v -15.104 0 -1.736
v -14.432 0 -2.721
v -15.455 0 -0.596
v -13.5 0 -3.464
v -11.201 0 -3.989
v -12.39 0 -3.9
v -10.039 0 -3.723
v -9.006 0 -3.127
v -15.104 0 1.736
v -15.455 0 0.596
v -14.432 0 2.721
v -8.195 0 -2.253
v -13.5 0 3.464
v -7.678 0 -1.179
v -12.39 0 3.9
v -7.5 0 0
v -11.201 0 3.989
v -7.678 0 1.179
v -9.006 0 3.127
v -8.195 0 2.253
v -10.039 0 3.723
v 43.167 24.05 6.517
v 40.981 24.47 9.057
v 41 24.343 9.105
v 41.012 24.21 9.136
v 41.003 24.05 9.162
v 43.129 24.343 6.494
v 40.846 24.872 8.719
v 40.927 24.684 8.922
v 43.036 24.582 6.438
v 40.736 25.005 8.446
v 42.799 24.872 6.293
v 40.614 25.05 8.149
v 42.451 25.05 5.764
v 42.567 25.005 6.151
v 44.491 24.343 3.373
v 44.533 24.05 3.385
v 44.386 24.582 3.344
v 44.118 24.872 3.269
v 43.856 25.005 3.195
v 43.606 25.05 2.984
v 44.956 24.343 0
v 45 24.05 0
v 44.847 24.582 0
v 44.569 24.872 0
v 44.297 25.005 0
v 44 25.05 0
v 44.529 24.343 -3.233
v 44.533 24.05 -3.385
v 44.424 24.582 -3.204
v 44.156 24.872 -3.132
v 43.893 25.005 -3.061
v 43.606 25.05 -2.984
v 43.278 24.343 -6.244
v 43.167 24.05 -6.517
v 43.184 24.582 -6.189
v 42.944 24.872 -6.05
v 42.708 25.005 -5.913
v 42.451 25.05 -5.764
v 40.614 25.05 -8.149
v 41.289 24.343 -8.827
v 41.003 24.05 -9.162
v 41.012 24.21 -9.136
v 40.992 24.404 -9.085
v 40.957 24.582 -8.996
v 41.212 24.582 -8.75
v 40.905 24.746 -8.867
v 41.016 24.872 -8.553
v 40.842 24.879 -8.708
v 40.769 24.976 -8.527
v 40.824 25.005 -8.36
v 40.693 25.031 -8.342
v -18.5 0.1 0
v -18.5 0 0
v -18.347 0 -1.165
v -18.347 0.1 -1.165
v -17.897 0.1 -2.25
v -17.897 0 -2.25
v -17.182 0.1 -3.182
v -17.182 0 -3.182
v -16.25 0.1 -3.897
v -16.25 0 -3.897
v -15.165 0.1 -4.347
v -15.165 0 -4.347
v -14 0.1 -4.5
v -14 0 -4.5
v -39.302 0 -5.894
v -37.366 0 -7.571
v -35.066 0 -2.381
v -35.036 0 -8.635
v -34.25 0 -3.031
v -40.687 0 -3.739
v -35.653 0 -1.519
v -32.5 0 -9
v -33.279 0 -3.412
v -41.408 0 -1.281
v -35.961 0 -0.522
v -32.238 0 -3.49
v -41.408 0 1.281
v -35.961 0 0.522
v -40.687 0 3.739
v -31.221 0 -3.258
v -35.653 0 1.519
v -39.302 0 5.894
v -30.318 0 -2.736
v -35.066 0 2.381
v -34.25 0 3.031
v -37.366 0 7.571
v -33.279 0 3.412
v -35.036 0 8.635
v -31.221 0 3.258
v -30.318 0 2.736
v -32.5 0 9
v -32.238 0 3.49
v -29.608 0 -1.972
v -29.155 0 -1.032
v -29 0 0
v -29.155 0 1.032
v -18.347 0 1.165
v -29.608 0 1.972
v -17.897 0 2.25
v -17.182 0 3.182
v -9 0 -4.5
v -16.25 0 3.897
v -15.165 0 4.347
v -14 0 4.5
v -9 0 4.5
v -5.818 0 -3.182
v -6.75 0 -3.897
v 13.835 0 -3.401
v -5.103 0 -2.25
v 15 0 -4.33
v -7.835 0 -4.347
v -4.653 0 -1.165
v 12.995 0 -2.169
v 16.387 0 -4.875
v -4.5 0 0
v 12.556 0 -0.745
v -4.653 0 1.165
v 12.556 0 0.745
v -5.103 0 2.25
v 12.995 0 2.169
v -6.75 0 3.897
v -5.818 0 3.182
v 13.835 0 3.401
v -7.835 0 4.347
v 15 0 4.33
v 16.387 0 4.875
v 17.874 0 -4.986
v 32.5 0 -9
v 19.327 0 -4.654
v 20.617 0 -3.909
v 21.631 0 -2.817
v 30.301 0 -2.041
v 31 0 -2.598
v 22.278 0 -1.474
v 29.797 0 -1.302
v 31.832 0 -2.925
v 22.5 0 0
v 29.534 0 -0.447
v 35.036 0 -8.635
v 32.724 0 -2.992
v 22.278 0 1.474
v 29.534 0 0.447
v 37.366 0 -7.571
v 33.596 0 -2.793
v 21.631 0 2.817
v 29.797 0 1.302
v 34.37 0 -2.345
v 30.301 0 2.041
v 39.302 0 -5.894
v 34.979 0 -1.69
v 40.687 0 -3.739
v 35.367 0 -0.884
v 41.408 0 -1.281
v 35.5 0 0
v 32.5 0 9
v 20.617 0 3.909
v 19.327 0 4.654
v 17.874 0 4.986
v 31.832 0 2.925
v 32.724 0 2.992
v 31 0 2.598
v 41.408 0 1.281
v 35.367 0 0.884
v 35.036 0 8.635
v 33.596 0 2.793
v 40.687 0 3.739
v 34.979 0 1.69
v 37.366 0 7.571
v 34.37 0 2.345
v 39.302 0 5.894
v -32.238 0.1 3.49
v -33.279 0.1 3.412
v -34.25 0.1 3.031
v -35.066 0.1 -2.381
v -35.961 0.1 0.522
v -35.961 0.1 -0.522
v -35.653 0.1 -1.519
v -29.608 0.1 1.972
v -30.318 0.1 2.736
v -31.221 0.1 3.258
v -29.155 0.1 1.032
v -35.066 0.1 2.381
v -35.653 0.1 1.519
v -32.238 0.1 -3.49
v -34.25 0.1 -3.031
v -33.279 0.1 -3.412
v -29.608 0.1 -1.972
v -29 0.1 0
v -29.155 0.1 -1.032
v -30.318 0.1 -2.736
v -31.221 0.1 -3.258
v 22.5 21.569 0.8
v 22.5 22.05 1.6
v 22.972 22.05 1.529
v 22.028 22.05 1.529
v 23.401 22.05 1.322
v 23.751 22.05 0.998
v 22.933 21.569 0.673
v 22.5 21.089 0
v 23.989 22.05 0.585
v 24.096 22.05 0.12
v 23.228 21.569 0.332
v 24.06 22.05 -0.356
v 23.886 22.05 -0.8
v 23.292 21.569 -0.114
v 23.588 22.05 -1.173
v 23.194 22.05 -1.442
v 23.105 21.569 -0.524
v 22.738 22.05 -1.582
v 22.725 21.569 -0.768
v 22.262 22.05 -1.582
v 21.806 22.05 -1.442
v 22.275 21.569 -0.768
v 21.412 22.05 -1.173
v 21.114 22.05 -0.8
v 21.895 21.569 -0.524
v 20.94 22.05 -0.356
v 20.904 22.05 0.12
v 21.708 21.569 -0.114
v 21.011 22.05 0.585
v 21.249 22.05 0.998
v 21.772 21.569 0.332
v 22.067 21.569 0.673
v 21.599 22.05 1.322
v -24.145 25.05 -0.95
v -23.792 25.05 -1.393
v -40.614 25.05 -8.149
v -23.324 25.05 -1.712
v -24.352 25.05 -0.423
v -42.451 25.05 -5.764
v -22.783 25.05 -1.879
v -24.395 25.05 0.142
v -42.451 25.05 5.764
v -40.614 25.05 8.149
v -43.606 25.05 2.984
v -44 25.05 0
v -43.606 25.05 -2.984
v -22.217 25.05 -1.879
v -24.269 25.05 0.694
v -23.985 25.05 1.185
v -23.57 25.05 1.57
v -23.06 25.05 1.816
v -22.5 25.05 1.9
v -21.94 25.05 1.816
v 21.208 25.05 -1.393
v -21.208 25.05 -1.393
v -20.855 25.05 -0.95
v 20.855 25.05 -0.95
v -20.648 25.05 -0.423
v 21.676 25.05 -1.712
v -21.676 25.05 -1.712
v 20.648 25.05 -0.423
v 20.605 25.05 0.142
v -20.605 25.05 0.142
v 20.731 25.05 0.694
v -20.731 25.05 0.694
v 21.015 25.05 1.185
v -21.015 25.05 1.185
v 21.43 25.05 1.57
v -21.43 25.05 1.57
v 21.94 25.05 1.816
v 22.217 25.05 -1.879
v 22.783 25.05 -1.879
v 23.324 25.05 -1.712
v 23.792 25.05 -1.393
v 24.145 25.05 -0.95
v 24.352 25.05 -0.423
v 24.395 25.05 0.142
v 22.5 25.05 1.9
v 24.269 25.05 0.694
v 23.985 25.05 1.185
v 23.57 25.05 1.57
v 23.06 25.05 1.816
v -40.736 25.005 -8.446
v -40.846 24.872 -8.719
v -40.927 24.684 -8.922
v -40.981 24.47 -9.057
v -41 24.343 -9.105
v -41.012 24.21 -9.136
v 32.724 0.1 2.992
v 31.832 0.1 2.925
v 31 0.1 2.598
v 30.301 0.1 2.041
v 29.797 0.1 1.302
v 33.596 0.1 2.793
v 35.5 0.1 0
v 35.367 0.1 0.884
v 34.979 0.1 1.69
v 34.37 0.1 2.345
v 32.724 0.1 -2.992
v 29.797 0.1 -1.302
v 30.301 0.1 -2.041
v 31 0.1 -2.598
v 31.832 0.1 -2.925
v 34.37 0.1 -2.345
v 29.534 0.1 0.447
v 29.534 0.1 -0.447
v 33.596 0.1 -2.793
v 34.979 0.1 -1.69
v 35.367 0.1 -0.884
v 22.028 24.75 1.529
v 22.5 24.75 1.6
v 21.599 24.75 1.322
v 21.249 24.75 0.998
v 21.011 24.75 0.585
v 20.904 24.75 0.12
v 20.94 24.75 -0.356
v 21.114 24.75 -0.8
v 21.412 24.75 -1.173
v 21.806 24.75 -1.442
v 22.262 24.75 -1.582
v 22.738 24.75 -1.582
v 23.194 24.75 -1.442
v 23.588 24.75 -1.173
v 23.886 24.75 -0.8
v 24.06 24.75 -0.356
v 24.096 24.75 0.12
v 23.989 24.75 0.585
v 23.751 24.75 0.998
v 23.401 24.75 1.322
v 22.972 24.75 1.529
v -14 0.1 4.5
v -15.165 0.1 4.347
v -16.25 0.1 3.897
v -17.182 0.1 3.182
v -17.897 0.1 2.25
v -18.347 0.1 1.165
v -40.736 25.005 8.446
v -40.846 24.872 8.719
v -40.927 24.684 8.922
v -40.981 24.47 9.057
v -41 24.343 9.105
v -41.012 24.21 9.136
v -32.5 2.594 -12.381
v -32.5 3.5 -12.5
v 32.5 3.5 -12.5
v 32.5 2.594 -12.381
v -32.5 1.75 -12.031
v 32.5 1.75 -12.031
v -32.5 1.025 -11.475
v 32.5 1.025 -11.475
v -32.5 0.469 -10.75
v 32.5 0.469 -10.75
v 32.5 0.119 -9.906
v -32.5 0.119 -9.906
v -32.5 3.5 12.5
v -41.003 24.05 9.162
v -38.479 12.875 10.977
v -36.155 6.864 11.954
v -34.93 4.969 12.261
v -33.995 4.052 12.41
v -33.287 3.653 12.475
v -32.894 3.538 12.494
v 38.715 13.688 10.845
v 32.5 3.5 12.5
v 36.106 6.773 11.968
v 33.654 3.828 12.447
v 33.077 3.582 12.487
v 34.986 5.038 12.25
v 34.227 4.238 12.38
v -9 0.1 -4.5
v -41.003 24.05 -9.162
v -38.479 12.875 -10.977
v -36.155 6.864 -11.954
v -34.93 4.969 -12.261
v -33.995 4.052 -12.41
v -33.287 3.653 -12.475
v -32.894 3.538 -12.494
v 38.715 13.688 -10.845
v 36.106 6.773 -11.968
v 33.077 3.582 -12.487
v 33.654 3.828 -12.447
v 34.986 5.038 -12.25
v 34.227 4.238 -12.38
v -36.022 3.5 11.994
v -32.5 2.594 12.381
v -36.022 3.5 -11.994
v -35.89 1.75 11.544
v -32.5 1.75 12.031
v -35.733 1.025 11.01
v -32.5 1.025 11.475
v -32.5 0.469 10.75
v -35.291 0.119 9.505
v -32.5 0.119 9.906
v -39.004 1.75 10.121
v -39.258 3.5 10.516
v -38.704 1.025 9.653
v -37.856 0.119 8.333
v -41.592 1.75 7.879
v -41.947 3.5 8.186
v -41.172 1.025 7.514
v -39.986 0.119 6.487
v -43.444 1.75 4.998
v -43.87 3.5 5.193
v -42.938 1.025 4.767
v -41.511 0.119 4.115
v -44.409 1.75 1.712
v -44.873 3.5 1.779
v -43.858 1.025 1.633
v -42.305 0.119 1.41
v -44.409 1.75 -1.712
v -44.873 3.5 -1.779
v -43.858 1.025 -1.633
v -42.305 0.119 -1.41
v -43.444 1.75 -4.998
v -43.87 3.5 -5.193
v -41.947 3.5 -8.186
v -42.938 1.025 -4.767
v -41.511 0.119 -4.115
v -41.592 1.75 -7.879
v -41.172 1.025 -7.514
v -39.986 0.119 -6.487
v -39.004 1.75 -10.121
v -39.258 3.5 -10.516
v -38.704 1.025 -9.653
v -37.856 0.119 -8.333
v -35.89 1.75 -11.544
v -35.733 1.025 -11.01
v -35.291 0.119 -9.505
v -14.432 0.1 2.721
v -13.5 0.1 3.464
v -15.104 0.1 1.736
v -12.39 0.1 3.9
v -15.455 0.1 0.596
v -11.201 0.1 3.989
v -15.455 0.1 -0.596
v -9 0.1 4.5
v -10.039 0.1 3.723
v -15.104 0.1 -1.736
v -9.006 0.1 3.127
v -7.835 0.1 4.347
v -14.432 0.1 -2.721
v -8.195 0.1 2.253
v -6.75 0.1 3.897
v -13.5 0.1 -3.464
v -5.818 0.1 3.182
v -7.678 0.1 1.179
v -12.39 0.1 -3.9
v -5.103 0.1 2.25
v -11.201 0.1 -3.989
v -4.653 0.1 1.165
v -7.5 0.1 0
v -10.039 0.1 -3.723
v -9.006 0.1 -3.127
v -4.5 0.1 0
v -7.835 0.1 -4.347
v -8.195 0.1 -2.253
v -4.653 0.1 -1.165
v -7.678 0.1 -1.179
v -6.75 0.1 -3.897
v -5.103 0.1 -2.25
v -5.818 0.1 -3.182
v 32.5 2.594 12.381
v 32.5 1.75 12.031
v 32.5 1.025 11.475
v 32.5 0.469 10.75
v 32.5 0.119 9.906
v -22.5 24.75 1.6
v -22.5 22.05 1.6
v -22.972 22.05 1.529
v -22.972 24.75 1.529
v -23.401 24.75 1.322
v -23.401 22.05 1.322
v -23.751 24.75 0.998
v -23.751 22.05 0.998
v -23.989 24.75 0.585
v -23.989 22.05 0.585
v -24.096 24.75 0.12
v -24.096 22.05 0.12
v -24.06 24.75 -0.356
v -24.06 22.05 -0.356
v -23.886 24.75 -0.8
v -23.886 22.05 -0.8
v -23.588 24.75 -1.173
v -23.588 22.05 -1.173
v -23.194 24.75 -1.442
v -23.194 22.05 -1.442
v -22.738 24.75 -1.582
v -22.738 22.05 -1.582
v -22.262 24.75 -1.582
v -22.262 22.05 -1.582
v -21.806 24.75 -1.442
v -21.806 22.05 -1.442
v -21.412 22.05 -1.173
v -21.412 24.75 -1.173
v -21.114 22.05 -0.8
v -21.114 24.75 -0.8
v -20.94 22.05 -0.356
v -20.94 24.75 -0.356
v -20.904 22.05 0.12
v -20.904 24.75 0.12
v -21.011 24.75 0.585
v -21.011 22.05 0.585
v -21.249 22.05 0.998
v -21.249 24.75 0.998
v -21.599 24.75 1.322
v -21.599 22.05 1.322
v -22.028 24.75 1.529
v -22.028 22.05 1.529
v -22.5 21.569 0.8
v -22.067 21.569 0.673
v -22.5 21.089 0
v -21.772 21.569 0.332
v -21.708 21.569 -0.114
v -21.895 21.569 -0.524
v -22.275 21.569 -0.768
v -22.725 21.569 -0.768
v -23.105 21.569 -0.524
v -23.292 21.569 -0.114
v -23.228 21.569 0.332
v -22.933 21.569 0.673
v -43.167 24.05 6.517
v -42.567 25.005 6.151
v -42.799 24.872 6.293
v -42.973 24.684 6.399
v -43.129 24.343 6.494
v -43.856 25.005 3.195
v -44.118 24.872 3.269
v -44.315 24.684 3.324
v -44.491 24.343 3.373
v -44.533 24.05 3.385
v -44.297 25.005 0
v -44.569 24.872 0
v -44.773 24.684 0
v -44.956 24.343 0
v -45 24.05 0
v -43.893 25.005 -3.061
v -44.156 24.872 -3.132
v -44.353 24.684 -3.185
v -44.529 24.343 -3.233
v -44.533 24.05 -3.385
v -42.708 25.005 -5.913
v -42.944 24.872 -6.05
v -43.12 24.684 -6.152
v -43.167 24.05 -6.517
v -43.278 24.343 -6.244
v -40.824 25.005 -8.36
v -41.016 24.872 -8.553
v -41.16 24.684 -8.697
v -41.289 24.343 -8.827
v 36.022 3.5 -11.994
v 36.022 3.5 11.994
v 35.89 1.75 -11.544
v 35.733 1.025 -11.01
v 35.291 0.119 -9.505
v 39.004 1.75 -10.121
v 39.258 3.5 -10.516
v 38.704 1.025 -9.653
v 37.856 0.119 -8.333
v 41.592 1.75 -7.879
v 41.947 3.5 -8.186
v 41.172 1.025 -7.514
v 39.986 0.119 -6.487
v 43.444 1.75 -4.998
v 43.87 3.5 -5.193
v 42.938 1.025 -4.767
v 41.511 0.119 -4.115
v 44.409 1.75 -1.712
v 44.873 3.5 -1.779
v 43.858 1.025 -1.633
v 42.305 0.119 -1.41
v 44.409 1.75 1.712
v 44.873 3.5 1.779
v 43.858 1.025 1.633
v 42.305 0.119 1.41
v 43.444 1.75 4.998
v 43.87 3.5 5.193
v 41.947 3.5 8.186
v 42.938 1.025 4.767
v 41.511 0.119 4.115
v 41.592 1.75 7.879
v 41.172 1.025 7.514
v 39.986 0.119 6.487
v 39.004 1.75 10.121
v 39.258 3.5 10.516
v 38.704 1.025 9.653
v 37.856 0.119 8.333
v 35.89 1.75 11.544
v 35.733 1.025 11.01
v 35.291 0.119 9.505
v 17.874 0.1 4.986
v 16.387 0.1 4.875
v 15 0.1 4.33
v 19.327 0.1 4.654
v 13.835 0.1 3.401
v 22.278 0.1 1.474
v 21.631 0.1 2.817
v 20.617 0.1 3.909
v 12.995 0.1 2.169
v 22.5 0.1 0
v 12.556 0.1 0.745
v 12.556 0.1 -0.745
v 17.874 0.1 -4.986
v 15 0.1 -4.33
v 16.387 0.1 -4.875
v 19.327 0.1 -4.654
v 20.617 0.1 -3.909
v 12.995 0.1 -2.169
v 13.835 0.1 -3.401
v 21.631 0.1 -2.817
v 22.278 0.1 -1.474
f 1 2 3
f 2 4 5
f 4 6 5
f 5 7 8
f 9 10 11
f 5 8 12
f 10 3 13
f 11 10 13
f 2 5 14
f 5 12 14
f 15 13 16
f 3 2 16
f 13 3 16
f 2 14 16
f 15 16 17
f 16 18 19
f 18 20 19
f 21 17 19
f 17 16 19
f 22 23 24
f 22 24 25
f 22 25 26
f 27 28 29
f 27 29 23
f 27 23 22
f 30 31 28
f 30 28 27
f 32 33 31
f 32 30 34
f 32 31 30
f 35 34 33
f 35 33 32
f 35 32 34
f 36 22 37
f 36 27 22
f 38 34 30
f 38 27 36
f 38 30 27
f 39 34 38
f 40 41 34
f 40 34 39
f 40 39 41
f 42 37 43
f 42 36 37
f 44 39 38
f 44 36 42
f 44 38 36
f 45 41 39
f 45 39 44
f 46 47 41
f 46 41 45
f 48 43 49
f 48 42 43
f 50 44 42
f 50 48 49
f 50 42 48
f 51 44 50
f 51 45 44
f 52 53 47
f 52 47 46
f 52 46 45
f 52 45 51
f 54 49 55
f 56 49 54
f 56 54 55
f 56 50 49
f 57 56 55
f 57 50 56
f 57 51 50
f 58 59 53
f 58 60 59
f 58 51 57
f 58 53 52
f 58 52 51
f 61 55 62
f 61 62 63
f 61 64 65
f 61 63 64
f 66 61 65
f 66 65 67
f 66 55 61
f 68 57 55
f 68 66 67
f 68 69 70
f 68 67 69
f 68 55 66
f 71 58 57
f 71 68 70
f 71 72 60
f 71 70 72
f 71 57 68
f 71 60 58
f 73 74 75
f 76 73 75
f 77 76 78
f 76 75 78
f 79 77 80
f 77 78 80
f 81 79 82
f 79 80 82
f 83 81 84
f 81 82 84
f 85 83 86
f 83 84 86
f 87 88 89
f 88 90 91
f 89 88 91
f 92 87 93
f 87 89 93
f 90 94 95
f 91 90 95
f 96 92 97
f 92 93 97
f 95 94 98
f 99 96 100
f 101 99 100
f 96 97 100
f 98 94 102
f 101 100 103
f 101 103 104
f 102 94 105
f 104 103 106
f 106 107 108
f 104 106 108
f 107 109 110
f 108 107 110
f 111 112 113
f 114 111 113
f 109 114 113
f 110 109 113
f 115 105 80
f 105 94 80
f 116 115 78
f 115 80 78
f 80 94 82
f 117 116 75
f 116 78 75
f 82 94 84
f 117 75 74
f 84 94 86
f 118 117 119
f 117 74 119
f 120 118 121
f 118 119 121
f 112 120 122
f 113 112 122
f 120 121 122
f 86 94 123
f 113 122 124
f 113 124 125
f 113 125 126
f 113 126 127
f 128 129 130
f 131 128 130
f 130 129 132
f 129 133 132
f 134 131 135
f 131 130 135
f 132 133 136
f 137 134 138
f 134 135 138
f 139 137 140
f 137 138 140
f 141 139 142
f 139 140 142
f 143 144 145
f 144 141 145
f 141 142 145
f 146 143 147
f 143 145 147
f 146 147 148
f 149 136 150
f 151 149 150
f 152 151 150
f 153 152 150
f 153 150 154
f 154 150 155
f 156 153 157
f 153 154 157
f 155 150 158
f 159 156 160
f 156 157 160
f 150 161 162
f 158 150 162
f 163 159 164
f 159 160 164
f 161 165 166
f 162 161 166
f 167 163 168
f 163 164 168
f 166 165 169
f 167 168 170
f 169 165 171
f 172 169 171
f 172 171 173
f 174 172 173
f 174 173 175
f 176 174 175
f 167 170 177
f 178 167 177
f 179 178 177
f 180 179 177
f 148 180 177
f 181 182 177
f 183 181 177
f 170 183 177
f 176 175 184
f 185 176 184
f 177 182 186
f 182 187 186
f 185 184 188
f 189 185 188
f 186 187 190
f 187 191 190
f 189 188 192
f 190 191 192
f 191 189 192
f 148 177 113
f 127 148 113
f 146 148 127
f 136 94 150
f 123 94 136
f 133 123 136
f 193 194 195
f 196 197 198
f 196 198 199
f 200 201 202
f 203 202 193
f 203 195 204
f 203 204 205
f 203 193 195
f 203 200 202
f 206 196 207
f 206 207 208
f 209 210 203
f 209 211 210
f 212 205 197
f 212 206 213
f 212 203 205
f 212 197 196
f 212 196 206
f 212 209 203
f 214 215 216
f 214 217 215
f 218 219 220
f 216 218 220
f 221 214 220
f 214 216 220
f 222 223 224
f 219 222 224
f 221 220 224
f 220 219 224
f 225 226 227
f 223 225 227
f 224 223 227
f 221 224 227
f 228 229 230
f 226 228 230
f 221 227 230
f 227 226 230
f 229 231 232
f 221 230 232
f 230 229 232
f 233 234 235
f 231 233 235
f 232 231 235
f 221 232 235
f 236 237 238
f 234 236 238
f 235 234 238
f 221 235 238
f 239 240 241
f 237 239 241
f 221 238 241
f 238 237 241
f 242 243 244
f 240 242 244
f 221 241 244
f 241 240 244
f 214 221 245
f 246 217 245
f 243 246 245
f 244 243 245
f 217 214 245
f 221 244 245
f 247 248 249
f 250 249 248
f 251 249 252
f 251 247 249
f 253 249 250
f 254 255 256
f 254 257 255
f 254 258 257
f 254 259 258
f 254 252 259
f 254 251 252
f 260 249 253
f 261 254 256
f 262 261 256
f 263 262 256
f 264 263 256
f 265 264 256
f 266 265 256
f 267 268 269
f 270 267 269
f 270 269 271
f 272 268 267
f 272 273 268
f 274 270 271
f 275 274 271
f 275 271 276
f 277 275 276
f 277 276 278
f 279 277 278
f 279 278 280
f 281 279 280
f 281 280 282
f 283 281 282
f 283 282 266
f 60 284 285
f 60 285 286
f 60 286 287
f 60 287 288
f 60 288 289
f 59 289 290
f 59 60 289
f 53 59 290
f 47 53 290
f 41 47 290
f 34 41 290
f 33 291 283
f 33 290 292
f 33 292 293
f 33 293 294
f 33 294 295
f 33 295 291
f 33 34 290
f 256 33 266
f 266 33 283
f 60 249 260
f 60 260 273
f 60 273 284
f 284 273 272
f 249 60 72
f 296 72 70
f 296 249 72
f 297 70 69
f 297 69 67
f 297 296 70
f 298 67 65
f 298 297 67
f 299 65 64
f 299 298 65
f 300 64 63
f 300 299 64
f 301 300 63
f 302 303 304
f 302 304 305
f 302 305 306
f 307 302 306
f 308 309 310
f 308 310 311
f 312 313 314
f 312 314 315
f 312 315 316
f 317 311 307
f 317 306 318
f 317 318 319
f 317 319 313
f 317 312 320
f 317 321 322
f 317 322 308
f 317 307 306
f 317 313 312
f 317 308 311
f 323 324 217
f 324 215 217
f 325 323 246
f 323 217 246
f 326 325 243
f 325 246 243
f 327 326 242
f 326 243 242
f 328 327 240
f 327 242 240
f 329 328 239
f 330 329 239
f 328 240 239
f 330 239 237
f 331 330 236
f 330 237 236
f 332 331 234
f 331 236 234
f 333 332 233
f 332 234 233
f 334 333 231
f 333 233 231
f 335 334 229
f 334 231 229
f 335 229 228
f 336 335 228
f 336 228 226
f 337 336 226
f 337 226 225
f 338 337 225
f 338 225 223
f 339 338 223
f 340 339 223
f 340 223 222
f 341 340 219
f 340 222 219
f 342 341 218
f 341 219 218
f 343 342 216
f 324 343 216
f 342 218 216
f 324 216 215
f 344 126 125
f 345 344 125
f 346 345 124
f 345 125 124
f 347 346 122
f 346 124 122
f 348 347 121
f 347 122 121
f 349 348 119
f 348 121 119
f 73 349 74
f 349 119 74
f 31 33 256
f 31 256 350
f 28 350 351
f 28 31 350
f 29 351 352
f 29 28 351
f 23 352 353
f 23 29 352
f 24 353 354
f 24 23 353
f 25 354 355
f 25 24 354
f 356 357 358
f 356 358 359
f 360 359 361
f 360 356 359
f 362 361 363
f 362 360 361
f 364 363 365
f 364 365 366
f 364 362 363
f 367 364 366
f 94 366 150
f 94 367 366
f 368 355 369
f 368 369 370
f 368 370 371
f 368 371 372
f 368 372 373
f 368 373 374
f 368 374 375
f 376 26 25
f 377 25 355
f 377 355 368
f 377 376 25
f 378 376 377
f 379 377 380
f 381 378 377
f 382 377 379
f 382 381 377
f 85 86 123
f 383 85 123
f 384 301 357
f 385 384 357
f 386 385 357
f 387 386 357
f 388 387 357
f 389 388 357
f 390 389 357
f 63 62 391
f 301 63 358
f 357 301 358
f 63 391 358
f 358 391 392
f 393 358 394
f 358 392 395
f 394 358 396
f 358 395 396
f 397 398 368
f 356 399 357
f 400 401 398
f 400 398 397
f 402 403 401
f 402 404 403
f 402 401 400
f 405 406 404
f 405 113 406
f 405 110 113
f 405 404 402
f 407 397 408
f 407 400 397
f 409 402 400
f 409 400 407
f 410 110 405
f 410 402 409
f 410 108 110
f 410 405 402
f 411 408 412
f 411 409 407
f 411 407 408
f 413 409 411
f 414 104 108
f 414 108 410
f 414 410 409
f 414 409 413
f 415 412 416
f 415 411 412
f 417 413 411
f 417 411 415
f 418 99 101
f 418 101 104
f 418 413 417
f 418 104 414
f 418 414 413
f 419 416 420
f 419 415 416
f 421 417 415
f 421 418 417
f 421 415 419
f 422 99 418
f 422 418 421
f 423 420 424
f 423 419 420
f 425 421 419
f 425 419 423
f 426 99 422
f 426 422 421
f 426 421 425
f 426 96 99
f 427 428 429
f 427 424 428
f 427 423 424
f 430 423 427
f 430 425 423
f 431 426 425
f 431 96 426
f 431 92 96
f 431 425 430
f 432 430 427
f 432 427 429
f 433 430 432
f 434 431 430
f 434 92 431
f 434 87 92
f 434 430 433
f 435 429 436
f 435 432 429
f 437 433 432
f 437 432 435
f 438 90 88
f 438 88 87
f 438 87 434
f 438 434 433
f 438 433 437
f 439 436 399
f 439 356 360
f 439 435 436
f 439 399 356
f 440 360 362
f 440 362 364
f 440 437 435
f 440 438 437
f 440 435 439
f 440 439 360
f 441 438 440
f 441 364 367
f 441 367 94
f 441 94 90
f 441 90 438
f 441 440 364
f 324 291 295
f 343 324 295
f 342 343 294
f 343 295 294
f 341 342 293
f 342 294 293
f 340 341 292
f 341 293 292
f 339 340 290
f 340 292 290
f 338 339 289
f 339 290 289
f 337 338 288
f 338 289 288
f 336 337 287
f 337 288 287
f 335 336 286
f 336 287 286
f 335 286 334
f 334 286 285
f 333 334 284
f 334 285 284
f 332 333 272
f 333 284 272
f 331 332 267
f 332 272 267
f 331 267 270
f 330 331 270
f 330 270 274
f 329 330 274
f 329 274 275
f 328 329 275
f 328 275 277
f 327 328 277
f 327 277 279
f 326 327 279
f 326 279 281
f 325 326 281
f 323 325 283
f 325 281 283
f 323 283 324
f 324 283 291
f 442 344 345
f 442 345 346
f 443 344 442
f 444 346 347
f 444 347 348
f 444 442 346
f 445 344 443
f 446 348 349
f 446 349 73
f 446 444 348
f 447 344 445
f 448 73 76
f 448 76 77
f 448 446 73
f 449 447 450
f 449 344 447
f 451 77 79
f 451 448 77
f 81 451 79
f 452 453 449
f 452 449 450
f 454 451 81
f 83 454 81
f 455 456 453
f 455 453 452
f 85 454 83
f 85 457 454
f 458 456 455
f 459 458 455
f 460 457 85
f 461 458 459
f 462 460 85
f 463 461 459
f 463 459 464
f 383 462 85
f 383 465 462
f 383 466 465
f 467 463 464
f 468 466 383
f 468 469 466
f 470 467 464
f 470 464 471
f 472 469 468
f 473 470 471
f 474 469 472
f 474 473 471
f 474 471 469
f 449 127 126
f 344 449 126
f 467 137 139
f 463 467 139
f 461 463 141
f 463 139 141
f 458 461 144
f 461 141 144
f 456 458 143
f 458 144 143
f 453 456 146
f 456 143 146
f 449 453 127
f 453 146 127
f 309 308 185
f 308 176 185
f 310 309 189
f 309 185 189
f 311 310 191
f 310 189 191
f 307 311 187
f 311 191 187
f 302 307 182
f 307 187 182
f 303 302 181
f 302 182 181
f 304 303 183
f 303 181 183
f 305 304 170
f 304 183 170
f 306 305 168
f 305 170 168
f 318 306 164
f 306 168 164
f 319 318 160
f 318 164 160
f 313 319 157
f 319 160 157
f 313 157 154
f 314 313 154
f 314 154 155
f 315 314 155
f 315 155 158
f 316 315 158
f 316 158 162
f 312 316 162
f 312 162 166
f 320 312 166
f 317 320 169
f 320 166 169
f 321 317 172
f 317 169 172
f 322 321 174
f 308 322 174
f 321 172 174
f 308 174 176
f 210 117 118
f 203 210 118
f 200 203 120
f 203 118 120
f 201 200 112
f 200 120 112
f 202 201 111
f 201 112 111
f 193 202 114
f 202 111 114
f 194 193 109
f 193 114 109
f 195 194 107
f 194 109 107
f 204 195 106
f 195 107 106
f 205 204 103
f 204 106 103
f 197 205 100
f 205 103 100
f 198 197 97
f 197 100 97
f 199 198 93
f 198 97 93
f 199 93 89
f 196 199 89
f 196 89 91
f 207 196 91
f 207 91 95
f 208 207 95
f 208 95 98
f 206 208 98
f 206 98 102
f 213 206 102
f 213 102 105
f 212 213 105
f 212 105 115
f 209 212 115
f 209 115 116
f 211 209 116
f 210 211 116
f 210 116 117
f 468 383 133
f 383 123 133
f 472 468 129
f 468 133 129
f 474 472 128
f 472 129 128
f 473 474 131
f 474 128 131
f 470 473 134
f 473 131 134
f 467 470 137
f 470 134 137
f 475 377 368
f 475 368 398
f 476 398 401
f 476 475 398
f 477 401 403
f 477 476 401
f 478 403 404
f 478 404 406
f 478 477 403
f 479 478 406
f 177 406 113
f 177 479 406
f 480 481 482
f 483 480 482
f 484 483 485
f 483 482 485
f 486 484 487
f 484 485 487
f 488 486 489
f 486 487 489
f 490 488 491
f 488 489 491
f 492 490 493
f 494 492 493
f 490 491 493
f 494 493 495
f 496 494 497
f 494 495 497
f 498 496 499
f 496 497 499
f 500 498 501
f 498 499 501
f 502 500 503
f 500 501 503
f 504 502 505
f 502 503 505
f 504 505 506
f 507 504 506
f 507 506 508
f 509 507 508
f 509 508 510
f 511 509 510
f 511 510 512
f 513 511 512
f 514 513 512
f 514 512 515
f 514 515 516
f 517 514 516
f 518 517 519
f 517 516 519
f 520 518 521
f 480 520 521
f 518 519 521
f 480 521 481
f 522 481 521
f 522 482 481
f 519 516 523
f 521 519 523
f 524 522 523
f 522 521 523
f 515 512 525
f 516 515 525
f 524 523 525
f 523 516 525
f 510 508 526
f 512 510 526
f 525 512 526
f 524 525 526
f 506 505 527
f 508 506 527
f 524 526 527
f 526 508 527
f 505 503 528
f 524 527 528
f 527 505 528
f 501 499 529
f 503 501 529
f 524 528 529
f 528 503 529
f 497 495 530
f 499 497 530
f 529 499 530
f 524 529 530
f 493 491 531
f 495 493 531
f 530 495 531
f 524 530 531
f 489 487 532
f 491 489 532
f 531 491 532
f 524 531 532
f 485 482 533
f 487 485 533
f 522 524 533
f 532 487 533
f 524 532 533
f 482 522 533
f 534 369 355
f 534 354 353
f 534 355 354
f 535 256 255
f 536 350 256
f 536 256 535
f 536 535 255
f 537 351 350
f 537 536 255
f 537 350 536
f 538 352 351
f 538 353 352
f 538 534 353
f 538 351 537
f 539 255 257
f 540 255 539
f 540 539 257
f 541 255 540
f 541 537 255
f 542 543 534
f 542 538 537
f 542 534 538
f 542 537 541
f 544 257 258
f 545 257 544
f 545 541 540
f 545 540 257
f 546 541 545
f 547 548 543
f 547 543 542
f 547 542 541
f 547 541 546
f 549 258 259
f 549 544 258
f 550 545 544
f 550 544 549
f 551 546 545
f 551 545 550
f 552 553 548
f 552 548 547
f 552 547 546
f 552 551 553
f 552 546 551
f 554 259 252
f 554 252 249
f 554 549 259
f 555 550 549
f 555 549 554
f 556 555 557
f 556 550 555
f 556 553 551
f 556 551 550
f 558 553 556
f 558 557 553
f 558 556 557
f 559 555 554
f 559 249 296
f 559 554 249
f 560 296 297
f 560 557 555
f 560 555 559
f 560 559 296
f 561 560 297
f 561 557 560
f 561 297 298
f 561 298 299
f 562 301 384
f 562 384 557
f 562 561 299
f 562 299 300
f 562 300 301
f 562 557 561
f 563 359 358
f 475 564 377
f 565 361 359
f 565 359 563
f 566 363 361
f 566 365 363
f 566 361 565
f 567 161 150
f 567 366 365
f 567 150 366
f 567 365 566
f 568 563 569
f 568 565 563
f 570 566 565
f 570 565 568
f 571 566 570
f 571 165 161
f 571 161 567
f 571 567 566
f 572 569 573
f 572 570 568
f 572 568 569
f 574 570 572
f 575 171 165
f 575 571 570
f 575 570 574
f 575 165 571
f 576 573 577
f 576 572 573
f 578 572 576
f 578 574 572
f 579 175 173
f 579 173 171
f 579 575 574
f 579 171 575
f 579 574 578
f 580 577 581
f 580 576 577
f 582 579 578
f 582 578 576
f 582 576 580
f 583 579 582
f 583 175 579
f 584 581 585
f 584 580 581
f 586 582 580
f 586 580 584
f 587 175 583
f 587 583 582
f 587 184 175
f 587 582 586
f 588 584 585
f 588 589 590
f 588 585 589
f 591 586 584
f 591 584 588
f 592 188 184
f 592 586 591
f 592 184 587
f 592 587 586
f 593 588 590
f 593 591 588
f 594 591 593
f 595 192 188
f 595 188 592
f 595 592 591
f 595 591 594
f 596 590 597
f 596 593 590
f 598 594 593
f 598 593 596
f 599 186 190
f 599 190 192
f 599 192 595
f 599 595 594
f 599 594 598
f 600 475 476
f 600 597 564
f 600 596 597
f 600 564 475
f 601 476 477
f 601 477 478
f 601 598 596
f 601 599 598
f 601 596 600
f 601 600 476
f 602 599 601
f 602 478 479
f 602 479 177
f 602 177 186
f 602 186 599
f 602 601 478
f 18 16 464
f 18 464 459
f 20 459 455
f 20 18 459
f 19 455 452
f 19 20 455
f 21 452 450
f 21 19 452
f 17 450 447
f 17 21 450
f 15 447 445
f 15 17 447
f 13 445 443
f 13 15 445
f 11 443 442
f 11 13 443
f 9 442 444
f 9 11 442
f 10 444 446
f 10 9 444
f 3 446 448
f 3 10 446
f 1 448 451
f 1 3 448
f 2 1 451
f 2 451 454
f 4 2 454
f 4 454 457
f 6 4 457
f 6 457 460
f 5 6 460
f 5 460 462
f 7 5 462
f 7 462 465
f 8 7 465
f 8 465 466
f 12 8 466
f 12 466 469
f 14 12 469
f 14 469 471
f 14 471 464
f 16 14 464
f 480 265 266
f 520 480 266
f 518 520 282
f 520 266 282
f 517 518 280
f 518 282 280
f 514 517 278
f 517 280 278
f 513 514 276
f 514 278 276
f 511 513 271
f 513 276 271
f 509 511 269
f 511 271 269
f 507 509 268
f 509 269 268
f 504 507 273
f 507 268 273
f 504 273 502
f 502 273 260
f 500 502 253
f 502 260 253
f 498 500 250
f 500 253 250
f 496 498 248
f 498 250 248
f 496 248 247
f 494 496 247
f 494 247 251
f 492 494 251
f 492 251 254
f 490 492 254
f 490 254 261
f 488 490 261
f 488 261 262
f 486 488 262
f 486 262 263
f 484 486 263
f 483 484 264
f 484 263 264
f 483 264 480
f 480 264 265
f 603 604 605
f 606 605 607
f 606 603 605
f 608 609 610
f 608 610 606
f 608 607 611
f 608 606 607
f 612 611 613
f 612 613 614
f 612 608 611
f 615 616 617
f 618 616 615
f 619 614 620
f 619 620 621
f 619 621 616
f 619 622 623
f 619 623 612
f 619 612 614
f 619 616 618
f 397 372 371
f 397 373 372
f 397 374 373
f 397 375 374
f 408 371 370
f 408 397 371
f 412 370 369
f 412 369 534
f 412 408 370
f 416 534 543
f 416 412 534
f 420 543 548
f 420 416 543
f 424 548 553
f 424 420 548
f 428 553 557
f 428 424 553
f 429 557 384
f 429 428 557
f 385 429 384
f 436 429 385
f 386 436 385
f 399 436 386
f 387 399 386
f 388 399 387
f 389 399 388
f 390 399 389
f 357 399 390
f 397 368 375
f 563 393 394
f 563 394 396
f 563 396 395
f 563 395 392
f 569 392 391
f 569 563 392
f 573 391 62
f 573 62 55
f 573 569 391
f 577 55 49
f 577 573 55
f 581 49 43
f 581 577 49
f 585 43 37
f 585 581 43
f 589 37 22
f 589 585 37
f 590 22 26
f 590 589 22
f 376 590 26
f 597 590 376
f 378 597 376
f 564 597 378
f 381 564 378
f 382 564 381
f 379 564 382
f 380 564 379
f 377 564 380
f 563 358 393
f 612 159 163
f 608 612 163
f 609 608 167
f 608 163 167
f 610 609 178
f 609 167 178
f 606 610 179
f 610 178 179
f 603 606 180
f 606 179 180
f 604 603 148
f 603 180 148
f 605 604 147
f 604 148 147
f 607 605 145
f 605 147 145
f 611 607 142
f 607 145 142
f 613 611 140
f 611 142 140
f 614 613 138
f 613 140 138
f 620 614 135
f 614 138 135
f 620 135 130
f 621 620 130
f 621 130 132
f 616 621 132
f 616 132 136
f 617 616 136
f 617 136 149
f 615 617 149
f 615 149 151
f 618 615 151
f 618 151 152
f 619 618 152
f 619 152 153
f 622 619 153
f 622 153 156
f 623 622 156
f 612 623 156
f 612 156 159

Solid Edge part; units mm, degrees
sketch "Sketch1" plane through (0, 0, 0) normal (0, -1, 0) x (1, 0, 0)
  arc A0 (32.5, 12.5) -> (32.5, -12.5) centre (32.5, 0) cw
  line L0 (-32.5, -12.5) -> (32.5, -12.5)
  arc A1 (-32.5, 12.5) -> (-32.5, -12.5) centre (-32.5, 0) ccw
  line L1 (-32.5, 12.5) -> (32.5, 12.5)
extrude "Protrusion1" add sketch "Sketch1" against normal blind 25.05
hole "Hole_3" at (22.5, 25.05, 0) direction (0, -1, 0) diameter 3.2 depth 3 tip angle 118 start chamfer 0.3 start chamfer angle 45
hole "Hole1" at (-22.5, 25.05, 0) direction (0, -1, 0) diameter 3.2 depth 3 tip angle 118 start chamfer 0.3 start chamfer angle 45
fillet "Round_2" radius 3.5 4 edges at (0, 0, 12.5) (45, 0, 0) (0, 0, -12.5) (-45, 0, 0)
sketch "Sketch2" plane through (0, 0, 0) normal (-1, 0, 0) x (0, -1, 0)
  line L0 (-3.5, 12.5) -> (-25.05, 12.5)
  line L1 (-25.05, 12.5) -> (-25.05, 9)
  line L2 (-25.05, 9) -> (-3.5, 12.5)
  line L3 (-25.05, -9) -> (-3.5, -12.5)
  line L4 (-3.5, -12.5) -> (-25.05, -12.5)
  line L5 (-25.05, -12.5) -> (-25.05, -9)
extrude "ExtrudedCutout_2" cut sketch "Sketch2" along normal mid plane 84
fillet "Round_4" radius 1 4 edges at (0, 25.05, 9) (-45, 25.05, 0) (0, 25.05, -9) (45, 25.05, 0)
sketch "Sketch3" plane through (0, 0, 0) normal (0, -1, 0) x (1, 0, 0)
  circle A0 centre (-32.5, 0) radius 3.5
  circle A1 centre (-11.5, 0) radius 4
  line L0 (-14, -4.5) -> (-9, -4.5)
  arc A2 (-9, -4.5) -> (-4.5, 0) centre (-9, 0) ccw
  arc A3 (-9, 4.5) -> (-4.5, 0) centre (-9, 0) cw
  line L1 (-9, 4.5) -> (-14, 4.5)
  arc A4 (-14, 4.5) -> (-18.5, 0) centre (-14, 0) ccw
  arc A5 (-18.5, 0) -> (-14, -4.5) centre (-14, 0) ccw
  circle A6 centre (17.5, 0) radius 5
  circle A7 centre (32.5, 0) radius 3
extrude "ExtrudedCutout_3" cut sketch "Sketch3" against normal blind 0.1
